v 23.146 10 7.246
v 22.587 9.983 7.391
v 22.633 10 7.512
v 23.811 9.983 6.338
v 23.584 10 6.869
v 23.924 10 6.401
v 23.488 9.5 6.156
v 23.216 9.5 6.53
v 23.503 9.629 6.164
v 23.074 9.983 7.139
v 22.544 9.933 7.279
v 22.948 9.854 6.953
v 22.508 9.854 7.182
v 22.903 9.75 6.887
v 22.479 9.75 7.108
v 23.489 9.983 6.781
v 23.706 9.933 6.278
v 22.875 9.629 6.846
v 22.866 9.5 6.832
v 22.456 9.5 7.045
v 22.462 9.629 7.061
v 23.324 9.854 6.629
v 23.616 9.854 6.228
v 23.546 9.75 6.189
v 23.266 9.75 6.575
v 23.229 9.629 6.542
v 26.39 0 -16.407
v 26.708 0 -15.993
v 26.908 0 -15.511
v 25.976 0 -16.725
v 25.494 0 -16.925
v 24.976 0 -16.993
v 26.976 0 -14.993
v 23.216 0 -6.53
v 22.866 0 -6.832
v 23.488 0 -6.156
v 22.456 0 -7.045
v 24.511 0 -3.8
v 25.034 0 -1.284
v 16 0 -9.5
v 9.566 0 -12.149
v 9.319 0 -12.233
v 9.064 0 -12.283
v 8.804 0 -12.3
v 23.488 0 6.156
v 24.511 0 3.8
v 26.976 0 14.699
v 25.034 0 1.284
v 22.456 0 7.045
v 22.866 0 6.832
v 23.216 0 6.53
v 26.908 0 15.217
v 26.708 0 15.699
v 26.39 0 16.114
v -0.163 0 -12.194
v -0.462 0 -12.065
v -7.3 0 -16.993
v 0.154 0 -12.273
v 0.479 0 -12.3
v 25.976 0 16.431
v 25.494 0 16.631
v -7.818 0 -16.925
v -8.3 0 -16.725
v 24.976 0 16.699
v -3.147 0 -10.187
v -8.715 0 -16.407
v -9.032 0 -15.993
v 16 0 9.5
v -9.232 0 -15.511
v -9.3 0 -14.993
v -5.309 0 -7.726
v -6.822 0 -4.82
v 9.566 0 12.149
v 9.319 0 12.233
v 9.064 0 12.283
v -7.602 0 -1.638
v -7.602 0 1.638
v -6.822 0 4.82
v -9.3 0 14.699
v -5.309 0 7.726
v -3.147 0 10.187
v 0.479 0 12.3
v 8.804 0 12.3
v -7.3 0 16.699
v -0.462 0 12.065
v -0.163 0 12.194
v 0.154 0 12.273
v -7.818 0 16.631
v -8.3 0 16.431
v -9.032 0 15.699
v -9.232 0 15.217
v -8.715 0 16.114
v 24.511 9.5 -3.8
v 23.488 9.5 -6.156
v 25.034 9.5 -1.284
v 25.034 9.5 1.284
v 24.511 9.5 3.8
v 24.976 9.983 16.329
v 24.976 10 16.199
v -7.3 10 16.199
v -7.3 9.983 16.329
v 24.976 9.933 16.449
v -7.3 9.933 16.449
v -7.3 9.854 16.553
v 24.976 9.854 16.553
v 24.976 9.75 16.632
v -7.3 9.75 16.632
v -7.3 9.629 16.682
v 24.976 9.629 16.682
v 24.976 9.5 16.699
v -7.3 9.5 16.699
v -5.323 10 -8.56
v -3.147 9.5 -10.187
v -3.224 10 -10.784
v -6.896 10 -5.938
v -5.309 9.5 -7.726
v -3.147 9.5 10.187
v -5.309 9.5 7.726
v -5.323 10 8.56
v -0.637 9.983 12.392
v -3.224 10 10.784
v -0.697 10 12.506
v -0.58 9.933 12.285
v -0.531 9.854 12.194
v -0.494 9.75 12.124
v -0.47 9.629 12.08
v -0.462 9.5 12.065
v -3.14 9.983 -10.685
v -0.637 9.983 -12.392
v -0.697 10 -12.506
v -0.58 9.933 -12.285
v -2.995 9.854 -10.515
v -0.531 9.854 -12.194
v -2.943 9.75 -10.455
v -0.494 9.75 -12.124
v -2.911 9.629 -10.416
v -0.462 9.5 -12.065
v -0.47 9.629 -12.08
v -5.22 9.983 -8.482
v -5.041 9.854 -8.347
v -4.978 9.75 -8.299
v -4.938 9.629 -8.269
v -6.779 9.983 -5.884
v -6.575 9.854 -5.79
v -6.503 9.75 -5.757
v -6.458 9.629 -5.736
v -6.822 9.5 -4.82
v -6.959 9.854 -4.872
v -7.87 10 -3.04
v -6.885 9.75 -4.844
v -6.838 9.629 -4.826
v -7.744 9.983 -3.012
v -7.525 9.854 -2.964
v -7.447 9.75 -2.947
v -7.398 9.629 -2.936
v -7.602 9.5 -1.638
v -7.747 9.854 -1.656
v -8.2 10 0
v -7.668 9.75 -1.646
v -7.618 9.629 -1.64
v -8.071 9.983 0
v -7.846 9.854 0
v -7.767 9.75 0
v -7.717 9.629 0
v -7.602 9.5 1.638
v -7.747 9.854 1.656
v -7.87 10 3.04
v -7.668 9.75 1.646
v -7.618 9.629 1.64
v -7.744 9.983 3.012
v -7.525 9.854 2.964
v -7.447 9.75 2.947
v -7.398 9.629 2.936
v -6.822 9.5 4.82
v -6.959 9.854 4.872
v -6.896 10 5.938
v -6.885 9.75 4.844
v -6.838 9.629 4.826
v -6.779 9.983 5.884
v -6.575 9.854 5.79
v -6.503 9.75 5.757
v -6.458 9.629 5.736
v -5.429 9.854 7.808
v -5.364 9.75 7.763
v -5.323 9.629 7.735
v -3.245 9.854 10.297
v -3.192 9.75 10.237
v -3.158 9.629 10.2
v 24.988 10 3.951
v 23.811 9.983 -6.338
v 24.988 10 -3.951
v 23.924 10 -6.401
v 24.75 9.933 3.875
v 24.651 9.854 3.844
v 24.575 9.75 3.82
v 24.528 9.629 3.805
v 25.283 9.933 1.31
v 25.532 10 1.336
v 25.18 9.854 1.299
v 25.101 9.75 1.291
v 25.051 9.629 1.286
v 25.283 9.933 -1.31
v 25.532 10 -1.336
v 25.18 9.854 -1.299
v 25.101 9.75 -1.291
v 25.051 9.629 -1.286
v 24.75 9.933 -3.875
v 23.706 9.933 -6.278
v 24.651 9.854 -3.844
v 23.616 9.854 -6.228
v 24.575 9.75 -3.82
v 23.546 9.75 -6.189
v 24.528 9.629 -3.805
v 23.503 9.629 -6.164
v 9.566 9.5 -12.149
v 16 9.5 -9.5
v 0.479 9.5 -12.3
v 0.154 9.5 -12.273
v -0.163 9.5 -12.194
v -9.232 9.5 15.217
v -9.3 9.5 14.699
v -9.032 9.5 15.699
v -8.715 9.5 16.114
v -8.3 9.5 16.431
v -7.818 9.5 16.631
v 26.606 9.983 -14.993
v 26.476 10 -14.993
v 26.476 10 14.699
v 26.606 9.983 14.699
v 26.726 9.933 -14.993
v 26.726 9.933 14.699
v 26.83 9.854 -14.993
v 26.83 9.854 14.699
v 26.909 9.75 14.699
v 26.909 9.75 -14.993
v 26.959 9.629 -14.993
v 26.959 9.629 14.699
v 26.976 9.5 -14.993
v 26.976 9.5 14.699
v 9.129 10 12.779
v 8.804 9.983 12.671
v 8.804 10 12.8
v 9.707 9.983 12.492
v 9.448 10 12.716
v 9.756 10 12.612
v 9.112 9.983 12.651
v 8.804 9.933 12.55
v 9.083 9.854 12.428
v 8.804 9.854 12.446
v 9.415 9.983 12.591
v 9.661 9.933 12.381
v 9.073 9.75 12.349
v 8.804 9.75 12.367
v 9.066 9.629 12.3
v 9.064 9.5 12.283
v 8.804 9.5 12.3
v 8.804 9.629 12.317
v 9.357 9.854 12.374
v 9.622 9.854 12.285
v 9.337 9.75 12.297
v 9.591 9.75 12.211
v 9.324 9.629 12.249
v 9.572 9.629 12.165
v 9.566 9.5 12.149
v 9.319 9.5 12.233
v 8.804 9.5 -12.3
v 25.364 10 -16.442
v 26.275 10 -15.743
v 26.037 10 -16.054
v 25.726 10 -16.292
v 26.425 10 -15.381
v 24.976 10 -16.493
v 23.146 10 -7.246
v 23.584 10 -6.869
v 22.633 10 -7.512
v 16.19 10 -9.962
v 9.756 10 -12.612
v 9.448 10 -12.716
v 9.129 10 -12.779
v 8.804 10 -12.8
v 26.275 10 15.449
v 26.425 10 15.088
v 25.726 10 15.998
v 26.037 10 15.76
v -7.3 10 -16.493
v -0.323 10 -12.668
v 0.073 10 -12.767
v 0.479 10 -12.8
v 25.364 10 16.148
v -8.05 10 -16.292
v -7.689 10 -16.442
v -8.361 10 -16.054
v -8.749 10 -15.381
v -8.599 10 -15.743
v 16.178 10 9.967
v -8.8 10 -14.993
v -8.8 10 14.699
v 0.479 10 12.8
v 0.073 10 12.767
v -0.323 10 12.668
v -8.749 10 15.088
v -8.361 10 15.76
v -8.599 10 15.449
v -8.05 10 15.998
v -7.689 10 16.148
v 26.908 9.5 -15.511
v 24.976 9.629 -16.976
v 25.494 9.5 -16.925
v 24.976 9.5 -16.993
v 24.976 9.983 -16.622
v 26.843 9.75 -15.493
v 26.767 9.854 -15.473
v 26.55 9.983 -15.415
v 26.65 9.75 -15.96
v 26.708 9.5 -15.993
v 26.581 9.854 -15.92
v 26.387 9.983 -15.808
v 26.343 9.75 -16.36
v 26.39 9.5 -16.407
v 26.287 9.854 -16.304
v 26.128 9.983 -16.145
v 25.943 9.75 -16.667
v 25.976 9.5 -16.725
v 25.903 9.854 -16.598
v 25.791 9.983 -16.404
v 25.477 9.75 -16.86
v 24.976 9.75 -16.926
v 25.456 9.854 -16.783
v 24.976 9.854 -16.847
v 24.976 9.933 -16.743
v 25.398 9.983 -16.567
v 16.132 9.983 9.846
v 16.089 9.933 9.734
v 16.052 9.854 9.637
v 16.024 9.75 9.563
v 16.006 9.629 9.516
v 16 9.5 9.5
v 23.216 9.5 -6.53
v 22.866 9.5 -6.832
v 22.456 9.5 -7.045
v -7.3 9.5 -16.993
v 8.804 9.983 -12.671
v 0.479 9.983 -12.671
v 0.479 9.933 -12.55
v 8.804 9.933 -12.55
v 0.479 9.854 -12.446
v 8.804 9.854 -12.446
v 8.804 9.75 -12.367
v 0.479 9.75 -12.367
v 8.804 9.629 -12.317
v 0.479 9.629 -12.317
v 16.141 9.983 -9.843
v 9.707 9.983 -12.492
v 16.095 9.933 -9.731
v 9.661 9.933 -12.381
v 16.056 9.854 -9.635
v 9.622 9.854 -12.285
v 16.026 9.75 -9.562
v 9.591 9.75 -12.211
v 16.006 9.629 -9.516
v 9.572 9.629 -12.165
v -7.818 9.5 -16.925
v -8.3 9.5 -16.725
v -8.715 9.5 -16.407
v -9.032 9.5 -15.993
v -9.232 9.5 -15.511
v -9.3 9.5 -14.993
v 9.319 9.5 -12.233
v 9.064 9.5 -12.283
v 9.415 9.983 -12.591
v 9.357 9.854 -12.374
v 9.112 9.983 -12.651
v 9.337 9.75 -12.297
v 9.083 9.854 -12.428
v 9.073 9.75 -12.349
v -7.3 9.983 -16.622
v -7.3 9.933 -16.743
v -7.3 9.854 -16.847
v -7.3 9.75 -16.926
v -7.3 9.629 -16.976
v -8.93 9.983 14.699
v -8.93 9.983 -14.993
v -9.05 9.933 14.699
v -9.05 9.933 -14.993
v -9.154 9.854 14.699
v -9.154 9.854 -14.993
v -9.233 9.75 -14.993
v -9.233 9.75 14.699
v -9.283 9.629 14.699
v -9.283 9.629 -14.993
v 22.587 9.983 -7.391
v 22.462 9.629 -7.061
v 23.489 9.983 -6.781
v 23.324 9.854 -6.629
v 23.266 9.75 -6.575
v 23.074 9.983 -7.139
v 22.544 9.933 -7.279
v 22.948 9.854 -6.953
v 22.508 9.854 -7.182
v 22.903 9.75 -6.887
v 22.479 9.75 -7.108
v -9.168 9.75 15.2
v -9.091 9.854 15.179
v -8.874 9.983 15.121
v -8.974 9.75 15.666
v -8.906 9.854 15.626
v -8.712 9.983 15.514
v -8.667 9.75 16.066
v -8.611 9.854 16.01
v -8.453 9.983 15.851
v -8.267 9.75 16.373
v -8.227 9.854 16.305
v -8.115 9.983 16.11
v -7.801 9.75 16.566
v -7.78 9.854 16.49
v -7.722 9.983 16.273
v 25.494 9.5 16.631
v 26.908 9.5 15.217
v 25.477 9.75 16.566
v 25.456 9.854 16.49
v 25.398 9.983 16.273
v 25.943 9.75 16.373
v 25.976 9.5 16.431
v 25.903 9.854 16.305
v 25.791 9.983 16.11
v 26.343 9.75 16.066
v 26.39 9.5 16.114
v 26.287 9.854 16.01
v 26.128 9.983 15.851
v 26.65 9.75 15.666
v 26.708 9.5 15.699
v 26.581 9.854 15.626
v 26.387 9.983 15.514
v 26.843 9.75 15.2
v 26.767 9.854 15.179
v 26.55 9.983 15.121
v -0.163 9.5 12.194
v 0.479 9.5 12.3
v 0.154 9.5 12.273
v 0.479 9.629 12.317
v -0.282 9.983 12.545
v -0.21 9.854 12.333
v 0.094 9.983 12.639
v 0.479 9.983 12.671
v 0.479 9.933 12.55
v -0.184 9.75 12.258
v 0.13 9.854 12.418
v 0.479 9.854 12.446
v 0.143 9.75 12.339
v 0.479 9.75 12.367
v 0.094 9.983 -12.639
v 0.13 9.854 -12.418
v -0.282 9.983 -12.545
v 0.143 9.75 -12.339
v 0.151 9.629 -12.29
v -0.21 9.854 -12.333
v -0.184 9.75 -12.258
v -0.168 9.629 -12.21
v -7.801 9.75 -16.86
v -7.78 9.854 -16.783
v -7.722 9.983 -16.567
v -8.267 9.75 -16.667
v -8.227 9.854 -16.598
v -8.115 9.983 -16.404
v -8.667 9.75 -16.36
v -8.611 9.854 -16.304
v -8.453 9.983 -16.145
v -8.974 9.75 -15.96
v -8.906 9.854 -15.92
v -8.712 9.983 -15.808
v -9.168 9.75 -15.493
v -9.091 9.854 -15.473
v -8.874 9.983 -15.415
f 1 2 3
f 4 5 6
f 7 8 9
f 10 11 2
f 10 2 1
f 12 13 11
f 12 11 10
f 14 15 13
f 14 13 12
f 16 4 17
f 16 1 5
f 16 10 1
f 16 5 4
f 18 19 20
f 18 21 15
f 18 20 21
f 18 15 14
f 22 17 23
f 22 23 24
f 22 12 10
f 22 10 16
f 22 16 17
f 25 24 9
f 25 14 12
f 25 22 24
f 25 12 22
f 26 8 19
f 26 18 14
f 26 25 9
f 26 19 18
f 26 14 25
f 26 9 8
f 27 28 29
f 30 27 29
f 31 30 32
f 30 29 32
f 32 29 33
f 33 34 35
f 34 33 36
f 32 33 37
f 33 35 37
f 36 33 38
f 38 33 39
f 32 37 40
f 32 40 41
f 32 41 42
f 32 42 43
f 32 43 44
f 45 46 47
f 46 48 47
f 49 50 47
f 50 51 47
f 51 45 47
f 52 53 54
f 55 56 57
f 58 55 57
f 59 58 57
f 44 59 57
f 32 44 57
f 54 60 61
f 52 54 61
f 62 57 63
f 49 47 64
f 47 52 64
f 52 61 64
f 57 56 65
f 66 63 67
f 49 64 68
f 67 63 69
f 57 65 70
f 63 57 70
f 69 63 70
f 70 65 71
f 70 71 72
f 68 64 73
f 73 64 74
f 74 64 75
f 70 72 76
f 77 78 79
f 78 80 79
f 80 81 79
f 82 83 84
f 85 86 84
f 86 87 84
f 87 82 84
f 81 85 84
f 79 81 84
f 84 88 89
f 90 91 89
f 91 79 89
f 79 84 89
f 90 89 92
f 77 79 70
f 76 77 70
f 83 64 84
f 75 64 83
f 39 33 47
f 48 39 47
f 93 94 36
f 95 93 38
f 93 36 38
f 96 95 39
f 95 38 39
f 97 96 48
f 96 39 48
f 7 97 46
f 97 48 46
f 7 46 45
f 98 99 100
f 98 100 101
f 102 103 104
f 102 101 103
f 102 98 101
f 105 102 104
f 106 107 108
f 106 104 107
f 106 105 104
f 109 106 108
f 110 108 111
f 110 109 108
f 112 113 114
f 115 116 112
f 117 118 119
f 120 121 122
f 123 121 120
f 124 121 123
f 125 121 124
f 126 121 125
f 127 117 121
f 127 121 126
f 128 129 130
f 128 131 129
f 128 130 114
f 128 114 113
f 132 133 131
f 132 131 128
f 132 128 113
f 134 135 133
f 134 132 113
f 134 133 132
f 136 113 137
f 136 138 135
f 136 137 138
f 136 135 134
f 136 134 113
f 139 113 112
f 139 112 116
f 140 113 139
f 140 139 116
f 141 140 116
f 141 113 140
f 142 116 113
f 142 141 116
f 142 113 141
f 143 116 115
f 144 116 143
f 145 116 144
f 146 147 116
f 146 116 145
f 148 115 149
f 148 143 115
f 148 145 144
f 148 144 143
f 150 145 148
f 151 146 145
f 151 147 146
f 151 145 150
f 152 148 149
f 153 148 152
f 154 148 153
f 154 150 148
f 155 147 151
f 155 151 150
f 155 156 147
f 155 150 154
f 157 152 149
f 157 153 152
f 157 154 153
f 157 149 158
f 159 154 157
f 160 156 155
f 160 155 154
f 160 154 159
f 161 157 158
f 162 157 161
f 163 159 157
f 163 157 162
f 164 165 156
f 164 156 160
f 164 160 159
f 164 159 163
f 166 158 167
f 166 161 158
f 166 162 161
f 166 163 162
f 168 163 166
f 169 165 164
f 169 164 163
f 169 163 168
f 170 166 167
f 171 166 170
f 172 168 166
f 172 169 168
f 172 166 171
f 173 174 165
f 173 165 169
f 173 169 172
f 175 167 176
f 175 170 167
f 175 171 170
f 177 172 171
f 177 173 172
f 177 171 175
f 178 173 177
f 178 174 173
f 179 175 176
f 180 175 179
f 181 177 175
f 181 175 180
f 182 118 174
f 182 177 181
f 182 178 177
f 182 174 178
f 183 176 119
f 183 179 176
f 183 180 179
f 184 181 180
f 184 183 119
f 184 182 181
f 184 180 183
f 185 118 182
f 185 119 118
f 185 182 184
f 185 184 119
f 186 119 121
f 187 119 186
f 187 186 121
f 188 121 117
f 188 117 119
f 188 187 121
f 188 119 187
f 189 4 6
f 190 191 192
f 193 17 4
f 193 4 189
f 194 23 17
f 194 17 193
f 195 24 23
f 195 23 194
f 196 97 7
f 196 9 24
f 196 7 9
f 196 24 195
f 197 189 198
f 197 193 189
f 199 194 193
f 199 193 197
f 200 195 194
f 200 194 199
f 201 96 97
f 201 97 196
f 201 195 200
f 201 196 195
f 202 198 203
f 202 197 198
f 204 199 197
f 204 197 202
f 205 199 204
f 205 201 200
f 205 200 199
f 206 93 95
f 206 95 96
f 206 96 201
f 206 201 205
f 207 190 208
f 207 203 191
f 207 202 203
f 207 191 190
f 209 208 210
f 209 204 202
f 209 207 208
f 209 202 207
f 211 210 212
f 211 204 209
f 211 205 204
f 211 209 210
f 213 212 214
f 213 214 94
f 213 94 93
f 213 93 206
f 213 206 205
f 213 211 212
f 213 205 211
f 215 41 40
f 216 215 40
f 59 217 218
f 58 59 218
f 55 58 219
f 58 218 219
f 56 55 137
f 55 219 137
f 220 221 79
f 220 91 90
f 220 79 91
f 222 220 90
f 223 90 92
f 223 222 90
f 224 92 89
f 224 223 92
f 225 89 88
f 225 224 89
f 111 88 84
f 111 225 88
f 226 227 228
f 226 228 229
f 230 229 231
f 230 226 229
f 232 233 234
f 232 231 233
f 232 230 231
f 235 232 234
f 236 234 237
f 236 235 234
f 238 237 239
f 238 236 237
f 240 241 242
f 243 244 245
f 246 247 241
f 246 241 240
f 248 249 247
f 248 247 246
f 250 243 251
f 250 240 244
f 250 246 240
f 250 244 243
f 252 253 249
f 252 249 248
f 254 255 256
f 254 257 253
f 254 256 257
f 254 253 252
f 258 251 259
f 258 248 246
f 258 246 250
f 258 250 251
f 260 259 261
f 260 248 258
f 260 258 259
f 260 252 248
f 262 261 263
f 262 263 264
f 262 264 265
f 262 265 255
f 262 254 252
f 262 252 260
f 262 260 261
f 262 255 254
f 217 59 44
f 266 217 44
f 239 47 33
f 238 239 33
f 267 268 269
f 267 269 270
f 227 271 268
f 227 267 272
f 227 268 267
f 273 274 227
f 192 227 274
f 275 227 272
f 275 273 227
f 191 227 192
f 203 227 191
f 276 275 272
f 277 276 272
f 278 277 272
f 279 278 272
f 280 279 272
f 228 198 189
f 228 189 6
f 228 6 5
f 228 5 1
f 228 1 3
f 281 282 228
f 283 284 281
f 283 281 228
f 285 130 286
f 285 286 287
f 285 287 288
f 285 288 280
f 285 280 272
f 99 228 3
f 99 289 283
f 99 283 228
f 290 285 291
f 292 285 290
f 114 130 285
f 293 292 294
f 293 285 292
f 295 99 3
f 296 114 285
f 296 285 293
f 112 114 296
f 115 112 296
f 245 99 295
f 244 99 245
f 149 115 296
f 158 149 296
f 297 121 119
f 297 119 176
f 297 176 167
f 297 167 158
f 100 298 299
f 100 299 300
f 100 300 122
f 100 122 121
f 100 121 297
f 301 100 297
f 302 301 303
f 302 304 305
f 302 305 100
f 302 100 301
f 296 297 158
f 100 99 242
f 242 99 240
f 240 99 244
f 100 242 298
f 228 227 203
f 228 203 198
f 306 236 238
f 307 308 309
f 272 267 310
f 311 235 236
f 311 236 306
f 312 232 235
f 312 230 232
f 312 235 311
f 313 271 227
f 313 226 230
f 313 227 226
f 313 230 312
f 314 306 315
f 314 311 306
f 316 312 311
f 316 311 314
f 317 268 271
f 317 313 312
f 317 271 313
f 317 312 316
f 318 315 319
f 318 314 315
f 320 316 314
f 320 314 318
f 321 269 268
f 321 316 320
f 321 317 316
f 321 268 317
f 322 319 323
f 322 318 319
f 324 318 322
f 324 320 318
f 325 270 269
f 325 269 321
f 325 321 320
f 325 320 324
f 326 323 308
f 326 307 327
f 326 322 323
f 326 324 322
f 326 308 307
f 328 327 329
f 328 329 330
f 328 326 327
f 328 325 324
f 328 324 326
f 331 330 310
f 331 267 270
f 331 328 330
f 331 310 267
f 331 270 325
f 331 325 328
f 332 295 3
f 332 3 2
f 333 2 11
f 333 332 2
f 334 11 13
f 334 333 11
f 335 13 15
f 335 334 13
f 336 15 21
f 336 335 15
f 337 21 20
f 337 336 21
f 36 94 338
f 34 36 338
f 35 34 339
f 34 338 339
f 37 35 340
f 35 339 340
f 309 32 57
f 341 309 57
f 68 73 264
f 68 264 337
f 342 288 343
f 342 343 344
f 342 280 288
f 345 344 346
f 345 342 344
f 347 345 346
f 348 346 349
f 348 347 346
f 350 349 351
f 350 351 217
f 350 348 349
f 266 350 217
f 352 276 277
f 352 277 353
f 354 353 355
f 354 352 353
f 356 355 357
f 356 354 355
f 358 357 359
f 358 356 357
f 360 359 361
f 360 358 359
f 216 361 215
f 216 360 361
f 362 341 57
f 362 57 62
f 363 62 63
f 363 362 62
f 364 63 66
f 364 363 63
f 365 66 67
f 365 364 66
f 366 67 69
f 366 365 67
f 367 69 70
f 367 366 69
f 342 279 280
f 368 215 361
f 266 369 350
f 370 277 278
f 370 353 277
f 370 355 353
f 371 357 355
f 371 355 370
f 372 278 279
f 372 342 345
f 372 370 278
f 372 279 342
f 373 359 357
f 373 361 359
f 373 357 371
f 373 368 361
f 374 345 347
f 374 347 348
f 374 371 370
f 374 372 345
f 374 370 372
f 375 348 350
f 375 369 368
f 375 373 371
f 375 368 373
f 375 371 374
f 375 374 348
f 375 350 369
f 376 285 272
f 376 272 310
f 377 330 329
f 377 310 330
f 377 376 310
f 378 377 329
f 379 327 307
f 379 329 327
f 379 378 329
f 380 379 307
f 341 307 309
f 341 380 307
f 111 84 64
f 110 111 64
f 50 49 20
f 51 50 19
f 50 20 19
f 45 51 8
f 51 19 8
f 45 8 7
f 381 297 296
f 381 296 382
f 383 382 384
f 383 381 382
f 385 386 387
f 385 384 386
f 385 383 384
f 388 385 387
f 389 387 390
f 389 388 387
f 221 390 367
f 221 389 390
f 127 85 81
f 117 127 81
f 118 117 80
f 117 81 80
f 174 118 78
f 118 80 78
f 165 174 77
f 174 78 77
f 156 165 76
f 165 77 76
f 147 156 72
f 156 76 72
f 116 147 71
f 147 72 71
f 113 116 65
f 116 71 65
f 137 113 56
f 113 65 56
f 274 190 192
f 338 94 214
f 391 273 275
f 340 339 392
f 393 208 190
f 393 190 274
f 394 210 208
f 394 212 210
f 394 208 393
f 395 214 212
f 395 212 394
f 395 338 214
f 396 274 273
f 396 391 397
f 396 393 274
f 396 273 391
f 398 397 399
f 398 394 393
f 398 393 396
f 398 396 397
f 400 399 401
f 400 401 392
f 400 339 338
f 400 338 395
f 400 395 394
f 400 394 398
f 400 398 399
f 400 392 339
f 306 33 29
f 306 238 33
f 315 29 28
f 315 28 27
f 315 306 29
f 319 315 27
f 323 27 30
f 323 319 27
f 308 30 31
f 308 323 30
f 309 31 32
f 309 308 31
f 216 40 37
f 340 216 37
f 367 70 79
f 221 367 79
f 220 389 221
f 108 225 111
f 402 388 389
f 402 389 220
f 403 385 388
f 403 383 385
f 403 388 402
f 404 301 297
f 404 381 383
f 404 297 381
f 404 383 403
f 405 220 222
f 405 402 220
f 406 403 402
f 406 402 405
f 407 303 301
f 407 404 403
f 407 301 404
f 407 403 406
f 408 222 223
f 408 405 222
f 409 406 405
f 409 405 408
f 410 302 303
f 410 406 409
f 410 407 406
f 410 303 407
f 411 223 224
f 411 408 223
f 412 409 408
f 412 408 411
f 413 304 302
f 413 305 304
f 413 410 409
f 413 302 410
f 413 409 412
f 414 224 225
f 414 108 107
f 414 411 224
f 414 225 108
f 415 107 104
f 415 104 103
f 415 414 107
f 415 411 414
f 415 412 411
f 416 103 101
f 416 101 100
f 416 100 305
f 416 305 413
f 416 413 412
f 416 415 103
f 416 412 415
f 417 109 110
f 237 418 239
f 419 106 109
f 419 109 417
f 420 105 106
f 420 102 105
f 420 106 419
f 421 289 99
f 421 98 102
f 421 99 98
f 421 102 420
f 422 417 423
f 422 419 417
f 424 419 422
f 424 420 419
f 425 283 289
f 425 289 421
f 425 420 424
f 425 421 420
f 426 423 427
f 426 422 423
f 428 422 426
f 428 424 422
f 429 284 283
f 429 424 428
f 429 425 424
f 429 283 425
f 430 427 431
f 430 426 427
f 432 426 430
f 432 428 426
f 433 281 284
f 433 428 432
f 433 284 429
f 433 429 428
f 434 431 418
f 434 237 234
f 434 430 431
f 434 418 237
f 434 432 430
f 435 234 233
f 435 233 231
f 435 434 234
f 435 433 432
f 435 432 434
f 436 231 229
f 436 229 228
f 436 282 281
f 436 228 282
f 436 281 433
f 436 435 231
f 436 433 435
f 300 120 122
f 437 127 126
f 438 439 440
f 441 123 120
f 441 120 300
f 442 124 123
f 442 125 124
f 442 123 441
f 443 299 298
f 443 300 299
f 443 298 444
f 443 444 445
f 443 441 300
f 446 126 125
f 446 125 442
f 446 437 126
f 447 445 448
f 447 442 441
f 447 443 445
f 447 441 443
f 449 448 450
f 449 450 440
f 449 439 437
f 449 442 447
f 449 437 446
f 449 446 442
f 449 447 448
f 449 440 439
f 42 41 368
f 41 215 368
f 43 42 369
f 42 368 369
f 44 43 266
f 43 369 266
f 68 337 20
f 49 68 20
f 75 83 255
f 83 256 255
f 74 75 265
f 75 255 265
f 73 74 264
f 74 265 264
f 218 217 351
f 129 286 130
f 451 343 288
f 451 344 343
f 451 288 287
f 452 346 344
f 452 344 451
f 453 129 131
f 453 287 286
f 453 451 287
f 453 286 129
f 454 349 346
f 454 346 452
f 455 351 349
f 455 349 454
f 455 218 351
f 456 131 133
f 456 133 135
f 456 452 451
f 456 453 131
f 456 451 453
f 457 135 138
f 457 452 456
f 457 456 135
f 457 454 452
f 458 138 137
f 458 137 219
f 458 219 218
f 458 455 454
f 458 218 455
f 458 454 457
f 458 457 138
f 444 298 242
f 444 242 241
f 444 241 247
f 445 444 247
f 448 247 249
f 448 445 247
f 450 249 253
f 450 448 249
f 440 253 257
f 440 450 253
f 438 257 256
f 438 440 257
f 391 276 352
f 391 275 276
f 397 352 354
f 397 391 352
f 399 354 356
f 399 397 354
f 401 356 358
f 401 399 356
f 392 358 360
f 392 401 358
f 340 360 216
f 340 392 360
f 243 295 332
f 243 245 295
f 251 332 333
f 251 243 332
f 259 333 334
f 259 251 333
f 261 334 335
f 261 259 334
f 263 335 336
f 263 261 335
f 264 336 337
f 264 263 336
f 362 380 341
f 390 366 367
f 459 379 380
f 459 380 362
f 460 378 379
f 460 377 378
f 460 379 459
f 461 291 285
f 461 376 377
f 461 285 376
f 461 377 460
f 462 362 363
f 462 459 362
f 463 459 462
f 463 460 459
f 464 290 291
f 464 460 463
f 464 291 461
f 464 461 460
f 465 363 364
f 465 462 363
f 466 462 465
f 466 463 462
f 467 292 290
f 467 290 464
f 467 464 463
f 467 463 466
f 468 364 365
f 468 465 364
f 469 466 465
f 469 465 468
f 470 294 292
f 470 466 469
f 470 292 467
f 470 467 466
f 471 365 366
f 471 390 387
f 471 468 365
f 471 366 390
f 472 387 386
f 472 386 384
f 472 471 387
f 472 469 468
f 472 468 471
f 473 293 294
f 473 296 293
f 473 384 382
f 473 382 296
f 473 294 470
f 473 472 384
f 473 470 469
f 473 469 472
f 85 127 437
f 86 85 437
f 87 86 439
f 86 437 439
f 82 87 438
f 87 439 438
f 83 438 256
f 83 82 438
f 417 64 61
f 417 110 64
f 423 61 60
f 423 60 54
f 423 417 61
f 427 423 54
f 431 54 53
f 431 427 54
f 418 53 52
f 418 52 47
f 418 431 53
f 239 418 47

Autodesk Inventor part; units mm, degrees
ref_plane "YZ Plane" through (0, 0, 0) normal (1, 0, 0) x (0, 1, 0)
ref_plane "XZ Plane" through (0, 0, 0) normal (0, 1, 0) x (-1, 0, 0)
ref_plane "XY Plane" through (0, 0, 0) normal (0, 0, 1) x (1, 0, 0)
sketch "Sketch6" plane through (0, 0, 0) normal (0, 1, 0) x (-1, 0, 0)
  arc A0 (0, -12.3) -> (0, 12.3) centre (-5.974, 0) ccw
  line L0 (0, -23.7314) -> (0, 23.4378) projected
  line L1 (0, 12.3) -> (-9.2, 12.3)
  line L2 (0, -12.3) -> (-9.2, -12.3)
  line L3 (-9.2, 12.3) -> (-16, 9.5)
  line L4 (-9.2, -12.3) -> (-16, -9.5)
  line L5 (-16, 9.5) -> (-23.1, 6.8)
  line L6 (-16, -9.5) -> (-23.1, -6.8)
  arc A1 (-23.1, 6.8) -> (-23.1, -6.8) centre (-12.54, 0) ccw
  line L7 (9.3004, 16.6993) -> (-26.9762, 16.6993)
  line L8 (-26.9762, 16.6993) -> (-26.9762, -16.993)
  line L9 (-26.9762, -16.993) -> (9.3004, -16.993)
  line L10 (9.3004, -16.993) -> (9.3004, 16.6993)
  point P0 (0, 0)
  point P1 (7.7, 0)
  point P2 (-25.1, 0)
  dimension "d4" = 0
  dimension "d6" = 0
  dimension "d7" = 7.7
  dimension "d8" = 9.2
  dimension "d9" = 9.2
  dimension "d10" = 2.8
  dimension "d11" = 2.8
  dimension "d12" = 6.8
  dimension "d13" = 6.8
  dimension "d15" = 24.6
  dimension "d16" = 7.1
  dimension "d17" = 7.1
  dimension "d18" = 2.7
  dimension "d19" = 2.7
  dimension "d20" = 2
extrude "Extrusion1" add sketch "Sketch6" along normal blind 10 contours A0 L0 L7 L10 L9 | L0 L9 L8 L7 L1 L3 L5 A1 L6 L4 L2
fillet "Fillet1" radius 2 8 edges at (0, 5, -12.3) (9.2, 5, -12.3) (16, 5, -9.5) (23.1, 5, -6.8) (23.1, 5, 6.8) (16, 5, 9.5) (9.2, 5, 12.3) (0, 5, 12.3)
fillet "Fillet2" radius 2 4 edges at (26.9762, 5, -16.993) (-9.3004, 5, -16.993) (-9.3004, 5, 16.6993) (26.9762, 5, 16.6993)
fillet "Fillet3" radius 0.5 8 edges at (26.3904, 10, -16.4072) (8.8379, 10, -16.993) (-8.7146, 10, -16.4072) (-9.3004, 10, -0.1468) (-8.7146, 10, 16.1135) (8.8379, 10, 16.6993) (26.3904, 10, 16.1135) (26.9762, 10, -0.1468)
fillet "Fillet4" radius 0.5 14 edges at (-0.006, 10, -12.2403) (4.6418, 10, -12.3) (9.1925, 10, -12.262) (12.7829, 10, -10.8247) (23.0498, 10, -6.6911) (19.2278, 10, -8.2725) (25.1, 10, 0) (23.0498, 10, 6.6911) (19.2278, 10, 8.2725) (9.1925, 10, 12.262) (12.7829, 10, 10.8247) (4.6418, 10, 12.3) (-0.006, 10, 12.2403) (-7.7, 10, 0)
properties part number "PipetteProfile_3DPrint"
